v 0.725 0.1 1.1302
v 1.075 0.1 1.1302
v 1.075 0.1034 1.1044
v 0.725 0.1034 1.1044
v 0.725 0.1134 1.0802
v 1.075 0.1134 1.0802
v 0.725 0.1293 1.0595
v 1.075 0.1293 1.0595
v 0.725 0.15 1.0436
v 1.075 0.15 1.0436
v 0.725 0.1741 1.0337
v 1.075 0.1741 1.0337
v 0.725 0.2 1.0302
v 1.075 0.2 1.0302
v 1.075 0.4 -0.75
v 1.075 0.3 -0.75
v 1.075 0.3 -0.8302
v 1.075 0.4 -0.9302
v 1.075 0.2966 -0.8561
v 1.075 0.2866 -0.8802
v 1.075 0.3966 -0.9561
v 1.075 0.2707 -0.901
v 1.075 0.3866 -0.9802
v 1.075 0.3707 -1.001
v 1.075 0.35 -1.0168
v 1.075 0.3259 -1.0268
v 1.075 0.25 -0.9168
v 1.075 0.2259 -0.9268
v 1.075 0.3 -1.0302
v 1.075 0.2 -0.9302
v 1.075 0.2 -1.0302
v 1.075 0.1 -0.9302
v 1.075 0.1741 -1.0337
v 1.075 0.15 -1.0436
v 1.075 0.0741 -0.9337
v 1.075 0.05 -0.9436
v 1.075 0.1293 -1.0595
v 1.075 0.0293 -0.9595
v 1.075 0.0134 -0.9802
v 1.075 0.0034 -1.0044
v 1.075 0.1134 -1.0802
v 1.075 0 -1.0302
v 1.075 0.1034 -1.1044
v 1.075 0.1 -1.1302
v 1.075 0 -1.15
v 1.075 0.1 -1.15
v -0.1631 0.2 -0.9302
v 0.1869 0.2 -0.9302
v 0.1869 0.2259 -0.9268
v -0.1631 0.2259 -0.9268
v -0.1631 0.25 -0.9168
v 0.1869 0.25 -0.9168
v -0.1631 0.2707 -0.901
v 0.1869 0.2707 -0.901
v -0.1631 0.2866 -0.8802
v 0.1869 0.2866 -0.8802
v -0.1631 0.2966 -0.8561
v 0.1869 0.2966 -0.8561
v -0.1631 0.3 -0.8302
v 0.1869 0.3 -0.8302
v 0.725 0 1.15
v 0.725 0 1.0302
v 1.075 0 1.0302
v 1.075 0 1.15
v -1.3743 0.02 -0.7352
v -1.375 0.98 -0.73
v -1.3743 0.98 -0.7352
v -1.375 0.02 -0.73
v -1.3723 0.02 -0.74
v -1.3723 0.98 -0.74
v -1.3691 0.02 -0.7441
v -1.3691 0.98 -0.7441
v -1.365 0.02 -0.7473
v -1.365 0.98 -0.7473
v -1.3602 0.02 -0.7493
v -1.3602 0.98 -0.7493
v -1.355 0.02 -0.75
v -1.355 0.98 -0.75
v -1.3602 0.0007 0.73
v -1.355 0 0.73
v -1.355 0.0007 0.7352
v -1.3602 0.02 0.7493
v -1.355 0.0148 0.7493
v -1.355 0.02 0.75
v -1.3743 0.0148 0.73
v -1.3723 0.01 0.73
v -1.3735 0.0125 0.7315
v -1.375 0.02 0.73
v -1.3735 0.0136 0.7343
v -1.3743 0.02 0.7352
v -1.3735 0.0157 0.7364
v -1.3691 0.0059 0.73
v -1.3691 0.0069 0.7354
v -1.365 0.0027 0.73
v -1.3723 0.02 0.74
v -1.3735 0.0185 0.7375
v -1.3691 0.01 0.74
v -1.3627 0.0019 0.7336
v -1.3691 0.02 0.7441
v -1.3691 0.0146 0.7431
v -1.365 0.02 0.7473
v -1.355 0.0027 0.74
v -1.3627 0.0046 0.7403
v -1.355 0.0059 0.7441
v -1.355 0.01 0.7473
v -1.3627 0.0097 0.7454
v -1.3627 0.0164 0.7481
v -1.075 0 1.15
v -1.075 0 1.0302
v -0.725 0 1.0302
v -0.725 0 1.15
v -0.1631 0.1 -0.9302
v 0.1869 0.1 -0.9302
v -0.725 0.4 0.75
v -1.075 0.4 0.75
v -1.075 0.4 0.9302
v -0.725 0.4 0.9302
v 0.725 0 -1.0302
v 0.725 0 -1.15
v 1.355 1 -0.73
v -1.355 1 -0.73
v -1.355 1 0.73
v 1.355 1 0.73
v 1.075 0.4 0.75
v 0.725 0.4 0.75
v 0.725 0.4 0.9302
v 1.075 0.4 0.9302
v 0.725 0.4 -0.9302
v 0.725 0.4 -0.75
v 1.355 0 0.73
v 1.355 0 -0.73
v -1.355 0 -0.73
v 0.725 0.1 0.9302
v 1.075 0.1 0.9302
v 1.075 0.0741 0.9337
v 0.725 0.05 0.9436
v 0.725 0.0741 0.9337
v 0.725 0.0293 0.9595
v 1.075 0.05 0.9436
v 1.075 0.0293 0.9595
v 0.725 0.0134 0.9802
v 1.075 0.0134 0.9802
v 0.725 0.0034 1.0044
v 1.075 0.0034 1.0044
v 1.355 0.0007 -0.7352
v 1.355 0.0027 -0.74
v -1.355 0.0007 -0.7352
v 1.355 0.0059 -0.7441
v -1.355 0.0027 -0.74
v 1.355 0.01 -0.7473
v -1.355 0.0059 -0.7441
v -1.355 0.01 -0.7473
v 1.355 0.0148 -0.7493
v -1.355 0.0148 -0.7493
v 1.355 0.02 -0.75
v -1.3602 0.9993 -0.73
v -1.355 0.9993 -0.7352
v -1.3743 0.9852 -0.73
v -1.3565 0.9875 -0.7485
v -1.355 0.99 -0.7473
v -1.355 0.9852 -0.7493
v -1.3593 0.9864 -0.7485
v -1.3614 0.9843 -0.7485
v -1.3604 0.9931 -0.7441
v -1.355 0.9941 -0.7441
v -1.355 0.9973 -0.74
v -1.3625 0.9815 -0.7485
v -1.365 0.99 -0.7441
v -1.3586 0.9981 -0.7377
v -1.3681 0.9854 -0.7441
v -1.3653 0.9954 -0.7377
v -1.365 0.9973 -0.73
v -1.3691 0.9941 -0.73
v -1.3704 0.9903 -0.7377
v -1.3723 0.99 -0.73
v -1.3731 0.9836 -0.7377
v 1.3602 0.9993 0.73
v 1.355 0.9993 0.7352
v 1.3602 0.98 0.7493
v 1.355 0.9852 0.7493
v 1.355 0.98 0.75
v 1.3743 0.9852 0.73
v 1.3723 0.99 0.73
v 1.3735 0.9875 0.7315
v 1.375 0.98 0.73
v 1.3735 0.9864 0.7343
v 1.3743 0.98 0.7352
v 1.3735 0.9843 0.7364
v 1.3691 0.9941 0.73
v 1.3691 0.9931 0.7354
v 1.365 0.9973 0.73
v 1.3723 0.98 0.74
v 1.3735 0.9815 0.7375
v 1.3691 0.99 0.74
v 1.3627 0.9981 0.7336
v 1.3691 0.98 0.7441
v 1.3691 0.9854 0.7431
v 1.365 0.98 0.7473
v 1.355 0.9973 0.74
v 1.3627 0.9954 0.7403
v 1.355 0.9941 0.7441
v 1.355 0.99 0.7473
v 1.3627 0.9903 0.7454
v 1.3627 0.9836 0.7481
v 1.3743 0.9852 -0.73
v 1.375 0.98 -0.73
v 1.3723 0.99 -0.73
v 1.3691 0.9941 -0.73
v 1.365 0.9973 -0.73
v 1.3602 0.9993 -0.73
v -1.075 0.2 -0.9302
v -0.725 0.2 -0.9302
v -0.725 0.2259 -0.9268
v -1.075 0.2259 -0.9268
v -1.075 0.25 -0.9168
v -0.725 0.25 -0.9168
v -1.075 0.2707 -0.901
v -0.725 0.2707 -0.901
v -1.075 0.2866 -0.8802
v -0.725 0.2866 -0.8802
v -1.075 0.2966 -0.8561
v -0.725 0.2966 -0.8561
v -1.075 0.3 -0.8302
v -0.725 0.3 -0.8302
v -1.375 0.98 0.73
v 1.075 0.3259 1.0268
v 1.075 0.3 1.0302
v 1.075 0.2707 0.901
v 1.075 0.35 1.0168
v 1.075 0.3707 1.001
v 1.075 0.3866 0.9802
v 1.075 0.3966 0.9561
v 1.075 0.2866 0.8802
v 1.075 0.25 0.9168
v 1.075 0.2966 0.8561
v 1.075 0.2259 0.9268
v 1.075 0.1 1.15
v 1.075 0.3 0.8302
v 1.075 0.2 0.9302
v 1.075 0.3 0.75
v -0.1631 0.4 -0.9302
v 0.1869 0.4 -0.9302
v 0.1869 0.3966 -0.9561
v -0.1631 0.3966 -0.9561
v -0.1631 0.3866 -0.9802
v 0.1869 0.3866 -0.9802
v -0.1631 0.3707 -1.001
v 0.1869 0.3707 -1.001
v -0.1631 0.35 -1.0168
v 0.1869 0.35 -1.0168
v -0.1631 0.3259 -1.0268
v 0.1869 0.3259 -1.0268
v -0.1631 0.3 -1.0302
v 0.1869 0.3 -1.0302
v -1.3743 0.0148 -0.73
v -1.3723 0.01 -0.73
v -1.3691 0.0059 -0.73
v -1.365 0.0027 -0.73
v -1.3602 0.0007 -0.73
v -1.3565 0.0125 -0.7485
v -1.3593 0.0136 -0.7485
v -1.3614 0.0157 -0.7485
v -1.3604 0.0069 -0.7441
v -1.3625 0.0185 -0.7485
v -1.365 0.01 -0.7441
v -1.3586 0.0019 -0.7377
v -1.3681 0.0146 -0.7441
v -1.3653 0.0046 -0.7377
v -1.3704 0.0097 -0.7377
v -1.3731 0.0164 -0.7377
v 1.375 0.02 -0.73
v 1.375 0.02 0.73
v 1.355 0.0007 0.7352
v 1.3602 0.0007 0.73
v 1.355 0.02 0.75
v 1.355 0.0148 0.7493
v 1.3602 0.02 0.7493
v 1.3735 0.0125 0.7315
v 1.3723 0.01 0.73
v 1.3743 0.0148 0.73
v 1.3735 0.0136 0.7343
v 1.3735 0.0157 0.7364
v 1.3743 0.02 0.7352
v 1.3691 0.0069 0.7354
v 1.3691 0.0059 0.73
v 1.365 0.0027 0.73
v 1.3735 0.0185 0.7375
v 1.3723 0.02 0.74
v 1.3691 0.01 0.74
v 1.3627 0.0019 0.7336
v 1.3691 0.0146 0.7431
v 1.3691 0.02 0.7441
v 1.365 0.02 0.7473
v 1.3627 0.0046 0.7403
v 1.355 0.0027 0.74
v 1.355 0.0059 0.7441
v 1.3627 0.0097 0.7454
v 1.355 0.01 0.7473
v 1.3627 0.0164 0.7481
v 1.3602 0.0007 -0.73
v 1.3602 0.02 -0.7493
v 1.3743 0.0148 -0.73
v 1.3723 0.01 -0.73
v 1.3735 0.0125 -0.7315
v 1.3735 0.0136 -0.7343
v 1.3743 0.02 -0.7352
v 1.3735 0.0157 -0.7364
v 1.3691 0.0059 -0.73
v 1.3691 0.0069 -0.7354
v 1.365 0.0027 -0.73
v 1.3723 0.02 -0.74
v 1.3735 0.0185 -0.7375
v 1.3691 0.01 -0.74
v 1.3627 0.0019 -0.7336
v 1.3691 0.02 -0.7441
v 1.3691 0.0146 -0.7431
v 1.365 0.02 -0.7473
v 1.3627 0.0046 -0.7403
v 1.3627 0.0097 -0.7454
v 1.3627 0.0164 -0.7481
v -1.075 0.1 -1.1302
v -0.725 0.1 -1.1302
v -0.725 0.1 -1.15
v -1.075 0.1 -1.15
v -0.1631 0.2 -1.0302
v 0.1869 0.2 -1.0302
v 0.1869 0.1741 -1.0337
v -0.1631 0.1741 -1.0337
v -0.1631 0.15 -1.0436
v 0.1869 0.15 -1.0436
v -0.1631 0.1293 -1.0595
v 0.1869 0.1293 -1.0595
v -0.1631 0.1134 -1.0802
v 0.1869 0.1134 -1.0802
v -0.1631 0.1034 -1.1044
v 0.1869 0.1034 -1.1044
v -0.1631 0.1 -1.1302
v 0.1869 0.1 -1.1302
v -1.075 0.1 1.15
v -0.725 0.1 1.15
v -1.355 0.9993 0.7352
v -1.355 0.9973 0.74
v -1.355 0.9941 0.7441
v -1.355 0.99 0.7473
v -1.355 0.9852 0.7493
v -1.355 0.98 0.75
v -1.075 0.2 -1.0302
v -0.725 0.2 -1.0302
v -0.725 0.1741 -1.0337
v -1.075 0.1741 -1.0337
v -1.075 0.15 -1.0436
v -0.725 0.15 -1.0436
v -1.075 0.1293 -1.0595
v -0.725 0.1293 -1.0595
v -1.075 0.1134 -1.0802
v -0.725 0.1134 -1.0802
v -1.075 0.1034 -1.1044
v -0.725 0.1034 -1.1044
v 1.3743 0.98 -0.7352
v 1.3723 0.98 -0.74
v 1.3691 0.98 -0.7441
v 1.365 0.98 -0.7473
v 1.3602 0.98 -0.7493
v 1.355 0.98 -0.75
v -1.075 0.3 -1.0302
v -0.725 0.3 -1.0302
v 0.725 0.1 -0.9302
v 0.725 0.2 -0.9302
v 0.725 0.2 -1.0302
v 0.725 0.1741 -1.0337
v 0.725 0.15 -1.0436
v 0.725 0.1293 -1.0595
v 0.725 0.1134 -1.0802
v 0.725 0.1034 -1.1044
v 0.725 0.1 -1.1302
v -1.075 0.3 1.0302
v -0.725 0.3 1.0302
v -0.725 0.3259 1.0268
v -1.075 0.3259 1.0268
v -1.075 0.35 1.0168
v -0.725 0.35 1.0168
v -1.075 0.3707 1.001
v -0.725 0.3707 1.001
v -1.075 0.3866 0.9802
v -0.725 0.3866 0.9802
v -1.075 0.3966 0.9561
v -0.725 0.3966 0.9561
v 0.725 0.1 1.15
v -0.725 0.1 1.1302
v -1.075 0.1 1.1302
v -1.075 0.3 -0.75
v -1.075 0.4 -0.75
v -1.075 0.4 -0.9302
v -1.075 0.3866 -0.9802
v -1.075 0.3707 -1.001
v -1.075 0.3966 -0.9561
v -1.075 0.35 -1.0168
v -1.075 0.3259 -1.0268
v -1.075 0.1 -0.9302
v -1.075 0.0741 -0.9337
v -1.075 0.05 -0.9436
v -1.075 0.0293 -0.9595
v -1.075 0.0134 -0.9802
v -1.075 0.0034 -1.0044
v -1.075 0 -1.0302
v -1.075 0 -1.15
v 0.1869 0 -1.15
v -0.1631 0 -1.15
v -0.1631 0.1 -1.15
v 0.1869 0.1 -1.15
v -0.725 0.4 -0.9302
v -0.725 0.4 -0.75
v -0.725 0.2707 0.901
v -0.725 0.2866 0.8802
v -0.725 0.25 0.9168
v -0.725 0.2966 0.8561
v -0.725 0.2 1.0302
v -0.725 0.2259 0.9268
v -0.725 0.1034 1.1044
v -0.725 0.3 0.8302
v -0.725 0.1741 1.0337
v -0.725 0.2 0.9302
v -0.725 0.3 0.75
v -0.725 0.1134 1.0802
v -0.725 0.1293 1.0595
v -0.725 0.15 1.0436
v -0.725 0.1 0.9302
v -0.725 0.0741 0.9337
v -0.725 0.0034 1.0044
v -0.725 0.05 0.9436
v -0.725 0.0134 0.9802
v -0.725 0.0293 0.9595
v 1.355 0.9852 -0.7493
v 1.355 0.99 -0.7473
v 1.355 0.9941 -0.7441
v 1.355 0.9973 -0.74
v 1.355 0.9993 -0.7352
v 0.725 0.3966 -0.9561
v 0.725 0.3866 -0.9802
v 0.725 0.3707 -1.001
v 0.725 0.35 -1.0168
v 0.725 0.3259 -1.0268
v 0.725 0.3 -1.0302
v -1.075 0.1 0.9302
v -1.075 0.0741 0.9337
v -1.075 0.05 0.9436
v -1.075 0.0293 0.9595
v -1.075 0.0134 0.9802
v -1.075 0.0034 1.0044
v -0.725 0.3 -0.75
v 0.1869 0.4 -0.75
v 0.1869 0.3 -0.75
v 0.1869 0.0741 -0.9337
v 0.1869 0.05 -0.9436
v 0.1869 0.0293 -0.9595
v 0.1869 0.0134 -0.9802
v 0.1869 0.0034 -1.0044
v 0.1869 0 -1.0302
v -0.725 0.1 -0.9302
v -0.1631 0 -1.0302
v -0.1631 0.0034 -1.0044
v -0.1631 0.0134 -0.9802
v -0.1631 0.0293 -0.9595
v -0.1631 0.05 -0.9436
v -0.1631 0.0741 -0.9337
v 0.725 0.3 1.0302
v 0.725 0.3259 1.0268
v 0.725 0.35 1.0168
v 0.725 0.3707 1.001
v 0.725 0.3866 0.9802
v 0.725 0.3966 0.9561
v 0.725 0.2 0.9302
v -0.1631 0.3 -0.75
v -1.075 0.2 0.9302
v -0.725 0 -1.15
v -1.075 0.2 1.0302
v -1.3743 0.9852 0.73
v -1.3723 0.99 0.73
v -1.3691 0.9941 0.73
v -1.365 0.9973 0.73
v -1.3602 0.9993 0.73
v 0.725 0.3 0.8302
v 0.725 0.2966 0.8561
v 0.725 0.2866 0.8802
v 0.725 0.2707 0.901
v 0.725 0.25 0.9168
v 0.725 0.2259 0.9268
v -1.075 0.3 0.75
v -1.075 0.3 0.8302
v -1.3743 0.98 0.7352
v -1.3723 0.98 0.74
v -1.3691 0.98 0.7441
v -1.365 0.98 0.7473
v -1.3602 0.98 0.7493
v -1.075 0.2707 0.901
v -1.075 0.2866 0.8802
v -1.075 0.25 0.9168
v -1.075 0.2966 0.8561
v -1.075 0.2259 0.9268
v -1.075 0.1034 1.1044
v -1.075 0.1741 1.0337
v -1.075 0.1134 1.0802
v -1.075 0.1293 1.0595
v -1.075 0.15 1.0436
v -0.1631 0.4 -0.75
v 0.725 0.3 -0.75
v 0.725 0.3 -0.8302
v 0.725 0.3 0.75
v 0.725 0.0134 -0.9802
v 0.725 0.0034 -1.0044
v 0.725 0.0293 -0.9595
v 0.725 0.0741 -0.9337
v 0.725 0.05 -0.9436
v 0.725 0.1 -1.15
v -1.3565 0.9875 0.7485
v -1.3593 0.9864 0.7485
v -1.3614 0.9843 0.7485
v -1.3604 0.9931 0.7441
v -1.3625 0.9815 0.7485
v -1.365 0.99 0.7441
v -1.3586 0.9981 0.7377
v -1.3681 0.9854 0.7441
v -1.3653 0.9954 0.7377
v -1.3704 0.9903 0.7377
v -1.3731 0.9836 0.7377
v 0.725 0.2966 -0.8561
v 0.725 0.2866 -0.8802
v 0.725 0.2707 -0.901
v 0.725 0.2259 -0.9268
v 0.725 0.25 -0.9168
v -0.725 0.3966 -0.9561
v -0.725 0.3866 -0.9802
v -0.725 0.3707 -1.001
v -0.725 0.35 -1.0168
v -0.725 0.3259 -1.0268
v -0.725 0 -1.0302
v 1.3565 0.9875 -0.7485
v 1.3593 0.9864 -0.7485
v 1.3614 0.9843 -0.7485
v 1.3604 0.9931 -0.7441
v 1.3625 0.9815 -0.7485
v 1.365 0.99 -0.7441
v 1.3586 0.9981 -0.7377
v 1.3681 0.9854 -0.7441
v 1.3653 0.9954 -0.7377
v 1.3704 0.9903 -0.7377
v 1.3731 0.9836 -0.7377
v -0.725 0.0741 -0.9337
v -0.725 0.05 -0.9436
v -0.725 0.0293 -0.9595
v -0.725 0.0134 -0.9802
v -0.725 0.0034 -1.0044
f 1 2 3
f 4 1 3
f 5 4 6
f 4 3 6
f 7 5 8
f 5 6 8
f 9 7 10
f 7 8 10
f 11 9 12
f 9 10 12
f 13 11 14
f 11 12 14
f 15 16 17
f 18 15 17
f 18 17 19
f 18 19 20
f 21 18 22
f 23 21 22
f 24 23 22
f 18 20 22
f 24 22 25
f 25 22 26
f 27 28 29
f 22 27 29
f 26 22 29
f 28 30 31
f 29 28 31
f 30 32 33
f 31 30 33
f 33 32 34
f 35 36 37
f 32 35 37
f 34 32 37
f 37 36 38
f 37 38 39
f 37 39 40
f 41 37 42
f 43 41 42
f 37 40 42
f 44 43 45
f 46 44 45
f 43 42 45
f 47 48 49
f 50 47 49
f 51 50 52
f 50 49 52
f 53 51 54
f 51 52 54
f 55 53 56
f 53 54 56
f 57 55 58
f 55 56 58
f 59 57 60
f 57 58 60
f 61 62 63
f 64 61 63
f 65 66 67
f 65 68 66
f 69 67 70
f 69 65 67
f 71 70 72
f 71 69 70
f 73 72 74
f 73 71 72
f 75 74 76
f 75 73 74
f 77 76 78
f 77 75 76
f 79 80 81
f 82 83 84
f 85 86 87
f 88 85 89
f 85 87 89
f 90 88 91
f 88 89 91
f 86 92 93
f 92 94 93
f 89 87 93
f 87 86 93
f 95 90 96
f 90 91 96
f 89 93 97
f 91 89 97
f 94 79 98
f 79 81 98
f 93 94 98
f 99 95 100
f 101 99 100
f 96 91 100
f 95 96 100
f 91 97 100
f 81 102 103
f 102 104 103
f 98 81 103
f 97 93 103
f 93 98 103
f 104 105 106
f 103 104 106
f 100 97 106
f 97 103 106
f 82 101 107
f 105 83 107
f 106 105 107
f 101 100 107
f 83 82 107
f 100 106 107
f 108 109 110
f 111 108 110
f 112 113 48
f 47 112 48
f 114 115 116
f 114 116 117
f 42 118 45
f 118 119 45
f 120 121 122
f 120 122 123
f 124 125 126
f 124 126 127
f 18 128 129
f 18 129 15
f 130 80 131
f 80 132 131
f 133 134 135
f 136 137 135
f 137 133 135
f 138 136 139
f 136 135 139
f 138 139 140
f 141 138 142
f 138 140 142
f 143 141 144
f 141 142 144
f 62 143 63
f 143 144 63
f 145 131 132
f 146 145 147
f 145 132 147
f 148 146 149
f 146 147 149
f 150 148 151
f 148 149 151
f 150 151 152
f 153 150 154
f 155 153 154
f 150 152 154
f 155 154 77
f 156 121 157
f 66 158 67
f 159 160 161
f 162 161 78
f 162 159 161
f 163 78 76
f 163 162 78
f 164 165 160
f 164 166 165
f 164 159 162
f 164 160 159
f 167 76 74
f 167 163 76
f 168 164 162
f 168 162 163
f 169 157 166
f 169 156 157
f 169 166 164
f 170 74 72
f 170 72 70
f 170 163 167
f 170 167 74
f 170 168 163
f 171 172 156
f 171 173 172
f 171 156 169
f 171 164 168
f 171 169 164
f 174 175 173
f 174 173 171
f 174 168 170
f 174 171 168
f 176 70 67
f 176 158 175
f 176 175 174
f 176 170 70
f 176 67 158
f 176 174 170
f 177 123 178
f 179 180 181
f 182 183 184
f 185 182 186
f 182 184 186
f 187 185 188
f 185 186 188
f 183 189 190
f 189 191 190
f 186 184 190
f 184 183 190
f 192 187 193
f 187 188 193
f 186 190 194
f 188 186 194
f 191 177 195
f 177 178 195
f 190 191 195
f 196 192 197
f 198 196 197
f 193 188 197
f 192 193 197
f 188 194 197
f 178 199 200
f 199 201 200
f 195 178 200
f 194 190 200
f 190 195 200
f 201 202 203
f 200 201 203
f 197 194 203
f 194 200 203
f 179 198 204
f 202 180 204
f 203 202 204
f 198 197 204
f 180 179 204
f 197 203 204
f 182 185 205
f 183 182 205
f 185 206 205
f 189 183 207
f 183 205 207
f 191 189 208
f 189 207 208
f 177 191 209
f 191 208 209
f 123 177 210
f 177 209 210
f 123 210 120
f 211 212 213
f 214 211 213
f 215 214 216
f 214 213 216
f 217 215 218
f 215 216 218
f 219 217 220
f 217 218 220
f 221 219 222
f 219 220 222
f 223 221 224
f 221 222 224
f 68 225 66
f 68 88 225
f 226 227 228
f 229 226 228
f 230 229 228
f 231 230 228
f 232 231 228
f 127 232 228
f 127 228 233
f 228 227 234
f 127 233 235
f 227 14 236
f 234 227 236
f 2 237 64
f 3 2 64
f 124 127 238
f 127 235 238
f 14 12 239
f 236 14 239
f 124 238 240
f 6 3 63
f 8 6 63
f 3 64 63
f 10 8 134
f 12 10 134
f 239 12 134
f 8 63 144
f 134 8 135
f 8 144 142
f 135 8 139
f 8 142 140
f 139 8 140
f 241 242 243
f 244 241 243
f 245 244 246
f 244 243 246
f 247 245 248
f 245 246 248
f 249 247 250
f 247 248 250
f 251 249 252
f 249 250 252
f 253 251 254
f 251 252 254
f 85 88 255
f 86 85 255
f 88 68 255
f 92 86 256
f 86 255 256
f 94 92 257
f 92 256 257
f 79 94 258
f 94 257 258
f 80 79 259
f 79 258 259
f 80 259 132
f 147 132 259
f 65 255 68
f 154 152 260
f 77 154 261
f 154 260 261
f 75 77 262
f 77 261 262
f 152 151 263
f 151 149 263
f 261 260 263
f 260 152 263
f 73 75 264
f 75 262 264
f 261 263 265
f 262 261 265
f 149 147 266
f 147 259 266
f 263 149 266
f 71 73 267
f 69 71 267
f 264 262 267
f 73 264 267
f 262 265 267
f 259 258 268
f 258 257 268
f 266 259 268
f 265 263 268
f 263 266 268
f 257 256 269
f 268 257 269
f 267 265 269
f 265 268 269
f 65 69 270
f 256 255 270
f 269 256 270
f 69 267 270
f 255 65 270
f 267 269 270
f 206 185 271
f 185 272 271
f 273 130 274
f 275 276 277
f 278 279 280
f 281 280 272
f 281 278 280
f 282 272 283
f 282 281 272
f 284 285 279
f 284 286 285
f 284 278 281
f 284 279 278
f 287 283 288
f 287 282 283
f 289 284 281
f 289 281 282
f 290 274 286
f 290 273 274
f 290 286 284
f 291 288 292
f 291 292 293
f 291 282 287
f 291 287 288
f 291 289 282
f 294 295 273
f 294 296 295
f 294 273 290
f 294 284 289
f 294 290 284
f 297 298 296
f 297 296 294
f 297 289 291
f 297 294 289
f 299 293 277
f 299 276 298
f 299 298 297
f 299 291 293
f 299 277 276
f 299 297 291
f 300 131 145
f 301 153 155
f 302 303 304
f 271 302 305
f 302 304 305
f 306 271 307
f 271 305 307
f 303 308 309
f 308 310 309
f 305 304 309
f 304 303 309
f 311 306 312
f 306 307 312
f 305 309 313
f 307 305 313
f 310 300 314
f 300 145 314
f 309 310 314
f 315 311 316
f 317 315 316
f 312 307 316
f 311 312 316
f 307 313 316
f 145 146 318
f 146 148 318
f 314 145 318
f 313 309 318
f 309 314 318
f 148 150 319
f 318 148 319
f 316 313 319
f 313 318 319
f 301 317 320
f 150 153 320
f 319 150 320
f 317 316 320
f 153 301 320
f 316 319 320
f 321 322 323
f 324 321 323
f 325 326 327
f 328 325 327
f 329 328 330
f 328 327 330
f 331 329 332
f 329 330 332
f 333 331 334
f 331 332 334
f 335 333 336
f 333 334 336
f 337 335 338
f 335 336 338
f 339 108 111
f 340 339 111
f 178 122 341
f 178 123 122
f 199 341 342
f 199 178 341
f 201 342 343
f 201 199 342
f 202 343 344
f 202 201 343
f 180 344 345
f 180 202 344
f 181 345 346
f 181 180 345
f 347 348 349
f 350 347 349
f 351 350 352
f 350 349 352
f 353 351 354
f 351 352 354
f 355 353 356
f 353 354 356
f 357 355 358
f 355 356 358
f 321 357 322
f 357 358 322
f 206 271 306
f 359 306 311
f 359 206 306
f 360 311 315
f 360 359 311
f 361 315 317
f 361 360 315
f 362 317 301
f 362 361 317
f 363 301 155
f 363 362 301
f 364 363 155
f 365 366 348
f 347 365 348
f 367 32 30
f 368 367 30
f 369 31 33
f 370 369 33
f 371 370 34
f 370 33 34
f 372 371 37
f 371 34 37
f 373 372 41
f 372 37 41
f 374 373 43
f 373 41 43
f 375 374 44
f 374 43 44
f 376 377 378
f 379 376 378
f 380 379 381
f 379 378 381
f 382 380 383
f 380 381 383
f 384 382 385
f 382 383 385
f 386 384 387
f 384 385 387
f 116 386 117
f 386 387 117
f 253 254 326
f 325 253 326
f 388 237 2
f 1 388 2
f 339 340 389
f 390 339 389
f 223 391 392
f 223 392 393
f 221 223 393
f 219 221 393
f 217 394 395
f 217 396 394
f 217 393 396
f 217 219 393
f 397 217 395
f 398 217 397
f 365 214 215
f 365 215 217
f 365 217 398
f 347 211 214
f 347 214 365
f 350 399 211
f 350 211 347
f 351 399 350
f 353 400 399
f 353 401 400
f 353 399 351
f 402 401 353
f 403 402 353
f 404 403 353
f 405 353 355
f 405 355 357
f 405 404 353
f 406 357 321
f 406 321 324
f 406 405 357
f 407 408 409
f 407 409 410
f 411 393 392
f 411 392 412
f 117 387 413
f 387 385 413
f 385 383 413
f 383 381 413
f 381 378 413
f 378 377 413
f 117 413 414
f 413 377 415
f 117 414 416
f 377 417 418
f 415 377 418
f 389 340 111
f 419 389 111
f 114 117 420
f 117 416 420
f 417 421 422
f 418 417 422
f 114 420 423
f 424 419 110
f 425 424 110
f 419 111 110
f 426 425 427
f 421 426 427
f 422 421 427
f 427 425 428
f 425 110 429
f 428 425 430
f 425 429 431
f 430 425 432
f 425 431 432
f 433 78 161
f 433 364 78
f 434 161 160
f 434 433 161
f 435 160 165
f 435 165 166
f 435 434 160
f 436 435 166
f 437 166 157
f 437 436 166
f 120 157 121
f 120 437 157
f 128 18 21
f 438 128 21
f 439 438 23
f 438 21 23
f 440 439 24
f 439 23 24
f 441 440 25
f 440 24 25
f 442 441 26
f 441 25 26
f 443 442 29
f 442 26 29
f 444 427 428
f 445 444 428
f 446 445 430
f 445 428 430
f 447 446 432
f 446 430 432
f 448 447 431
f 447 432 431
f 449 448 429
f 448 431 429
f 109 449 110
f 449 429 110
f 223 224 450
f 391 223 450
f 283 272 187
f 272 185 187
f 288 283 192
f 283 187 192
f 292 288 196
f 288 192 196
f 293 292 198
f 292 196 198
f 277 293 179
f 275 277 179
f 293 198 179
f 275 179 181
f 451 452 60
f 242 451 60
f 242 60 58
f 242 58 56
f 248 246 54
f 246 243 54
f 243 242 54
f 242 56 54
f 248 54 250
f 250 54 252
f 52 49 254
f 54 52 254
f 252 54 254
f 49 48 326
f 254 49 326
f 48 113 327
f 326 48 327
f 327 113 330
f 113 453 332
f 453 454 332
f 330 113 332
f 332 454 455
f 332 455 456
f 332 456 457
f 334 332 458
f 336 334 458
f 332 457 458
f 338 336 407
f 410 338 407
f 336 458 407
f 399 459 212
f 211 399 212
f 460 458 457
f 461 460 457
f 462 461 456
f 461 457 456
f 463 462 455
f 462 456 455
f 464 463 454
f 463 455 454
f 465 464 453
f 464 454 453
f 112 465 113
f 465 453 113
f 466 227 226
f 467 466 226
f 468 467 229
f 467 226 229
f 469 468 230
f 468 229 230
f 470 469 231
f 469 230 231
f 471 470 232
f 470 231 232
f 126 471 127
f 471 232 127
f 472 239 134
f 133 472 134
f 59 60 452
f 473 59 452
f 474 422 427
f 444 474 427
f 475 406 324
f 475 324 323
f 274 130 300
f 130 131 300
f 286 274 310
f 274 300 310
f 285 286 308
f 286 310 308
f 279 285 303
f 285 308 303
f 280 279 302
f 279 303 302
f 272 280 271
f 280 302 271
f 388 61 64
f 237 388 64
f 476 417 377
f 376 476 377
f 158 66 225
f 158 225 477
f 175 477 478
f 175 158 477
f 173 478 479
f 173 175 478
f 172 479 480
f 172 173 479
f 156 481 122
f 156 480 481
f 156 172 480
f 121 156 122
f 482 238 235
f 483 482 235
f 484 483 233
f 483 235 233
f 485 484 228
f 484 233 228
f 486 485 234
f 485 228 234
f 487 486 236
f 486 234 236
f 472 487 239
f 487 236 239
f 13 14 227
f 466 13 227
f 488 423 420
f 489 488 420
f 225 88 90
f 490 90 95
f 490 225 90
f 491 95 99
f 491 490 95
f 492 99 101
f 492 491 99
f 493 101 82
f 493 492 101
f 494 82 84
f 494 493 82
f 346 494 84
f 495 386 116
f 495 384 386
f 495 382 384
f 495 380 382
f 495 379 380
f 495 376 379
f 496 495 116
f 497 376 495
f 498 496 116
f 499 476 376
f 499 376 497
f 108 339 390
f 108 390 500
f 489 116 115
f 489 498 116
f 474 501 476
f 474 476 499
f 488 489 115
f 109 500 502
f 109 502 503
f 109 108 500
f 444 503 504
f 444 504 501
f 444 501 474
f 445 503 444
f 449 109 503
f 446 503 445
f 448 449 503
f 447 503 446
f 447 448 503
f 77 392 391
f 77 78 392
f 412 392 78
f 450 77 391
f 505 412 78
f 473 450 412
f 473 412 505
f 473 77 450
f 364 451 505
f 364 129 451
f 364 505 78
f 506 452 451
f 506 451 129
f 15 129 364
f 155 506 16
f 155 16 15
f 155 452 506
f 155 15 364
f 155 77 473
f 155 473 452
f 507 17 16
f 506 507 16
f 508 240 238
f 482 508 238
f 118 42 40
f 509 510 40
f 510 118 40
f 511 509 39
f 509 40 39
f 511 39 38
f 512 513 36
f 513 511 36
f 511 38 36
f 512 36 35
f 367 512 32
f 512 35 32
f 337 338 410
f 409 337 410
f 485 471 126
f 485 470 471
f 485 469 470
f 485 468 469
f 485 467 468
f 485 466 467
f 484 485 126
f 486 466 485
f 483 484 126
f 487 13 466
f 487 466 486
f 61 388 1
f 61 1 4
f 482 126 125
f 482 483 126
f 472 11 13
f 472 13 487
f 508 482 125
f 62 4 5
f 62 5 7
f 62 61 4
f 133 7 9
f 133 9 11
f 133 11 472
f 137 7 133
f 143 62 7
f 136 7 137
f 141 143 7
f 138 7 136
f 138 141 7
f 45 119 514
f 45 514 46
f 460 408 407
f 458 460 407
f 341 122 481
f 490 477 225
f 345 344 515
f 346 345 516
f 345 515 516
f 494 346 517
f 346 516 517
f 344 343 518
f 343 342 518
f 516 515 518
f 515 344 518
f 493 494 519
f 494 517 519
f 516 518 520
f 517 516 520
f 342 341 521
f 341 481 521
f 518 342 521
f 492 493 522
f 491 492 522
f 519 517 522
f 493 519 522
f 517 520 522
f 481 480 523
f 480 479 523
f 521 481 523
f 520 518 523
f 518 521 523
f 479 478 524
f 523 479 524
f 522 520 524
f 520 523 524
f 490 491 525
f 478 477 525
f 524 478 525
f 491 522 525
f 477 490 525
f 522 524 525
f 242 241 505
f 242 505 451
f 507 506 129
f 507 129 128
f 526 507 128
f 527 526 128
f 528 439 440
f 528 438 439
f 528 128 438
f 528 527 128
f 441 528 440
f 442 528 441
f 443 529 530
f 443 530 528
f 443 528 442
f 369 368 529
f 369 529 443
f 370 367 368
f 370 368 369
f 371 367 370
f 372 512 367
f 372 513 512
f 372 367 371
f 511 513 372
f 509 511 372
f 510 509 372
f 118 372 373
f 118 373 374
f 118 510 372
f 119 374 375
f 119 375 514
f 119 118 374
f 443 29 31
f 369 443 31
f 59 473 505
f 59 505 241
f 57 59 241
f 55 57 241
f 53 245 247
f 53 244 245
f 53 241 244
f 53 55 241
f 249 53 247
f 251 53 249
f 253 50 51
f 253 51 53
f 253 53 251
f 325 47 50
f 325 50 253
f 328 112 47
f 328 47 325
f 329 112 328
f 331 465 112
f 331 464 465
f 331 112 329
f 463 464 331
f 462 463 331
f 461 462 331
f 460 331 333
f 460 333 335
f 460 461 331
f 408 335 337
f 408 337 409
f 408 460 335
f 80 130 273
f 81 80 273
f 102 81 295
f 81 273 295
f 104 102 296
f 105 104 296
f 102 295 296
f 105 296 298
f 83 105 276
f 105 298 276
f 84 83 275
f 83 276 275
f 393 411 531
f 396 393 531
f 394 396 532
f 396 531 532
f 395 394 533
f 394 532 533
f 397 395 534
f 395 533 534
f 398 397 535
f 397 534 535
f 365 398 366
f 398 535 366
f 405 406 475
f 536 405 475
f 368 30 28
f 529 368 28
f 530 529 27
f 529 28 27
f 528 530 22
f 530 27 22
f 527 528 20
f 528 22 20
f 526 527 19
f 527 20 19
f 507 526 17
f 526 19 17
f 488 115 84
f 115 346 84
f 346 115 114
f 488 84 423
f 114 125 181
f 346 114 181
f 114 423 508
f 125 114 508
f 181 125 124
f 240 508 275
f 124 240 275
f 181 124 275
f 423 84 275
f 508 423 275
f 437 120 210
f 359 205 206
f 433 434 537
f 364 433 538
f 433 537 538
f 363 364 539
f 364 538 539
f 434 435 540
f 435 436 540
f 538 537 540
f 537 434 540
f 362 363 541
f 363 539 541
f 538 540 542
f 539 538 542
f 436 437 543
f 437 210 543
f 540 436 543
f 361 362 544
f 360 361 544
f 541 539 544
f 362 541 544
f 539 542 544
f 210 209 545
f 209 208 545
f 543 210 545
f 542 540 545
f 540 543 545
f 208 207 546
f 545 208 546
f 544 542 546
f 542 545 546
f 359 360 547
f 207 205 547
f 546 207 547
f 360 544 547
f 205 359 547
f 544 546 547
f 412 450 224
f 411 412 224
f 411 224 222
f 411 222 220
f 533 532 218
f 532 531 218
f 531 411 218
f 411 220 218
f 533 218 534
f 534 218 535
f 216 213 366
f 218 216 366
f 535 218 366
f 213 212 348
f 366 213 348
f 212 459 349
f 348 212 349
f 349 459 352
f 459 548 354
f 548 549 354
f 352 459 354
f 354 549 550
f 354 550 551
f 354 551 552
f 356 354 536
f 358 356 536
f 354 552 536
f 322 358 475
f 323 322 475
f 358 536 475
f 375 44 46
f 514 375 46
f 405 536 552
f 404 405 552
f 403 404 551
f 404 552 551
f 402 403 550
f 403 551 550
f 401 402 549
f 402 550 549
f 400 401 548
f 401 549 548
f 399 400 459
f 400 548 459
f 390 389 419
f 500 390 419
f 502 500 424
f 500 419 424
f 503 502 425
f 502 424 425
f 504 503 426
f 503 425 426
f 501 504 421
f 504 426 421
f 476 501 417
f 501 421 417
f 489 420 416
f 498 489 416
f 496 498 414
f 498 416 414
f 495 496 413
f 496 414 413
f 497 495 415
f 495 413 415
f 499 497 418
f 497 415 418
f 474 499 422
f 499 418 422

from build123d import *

# Parameters (mm, degrees)
SKETCH1_W           = 2.75
SKETCH1_H           = 1.5
BOSS_EXTRUDE1_DEPTH = 1
SKETCH2_W           = 0.35
SKETCH2_H           = 0.4
BOSS_EXTRUDE2_DEPTH = 0.4
CUT_EXTRUDE1_DEPTH  = 3.45
FILLET1_R           = 0.02


with BuildPart() as part:
    # Sketch1 → Boss-Extrude1 (new body)
    with BuildSketch(Plane(origin=(0, 0, 0), x_dir=(1, 0, 0), z_dir=(0, 1, 0))):
        Rectangle(SKETCH1_W, SKETCH1_H)
    extrude(amount=BOSS_EXTRUDE1_DEPTH)

    # Sketch2 → Boss-Extrude2 (add)
    with BuildSketch(Plane(origin=(0, 0, 0), x_dir=(1, 0, 0), z_dir=(0, 1, 0))):
        with Locations((-0.9, -0.95)):
            Rectangle(SKETCH2_W, SKETCH2_H)
        with Locations((0.9, -0.95)):
            Rectangle(SKETCH2_W, SKETCH2_H)
        with Locations((0.9, 0.95)):
            Rectangle(SKETCH2_W, SKETCH2_H)
        with Locations((-0.9, 0.95)):
            Rectangle(SKETCH2_W, SKETCH2_H)
        with Locations((0.01189142, 0.95)):
            Rectangle(SKETCH2_W, SKETCH2_H)
    extrude(amount=BOSS_EXTRUDE2_DEPTH)

    # Sketch3 → Cut-Extrude1 (cut, through all)
    with BuildSketch(Plane(origin=(1.075, 0, 0), x_dir=(0, 0, -1), z_dir=(1, 0, 0))):
        with BuildLine():
            Line((1.15, 0), (1.03024595, 0))
            Line((1.03024595, 0), (0.75, 0))
            Line((0.75, 0), (-0.75, 0))
            Line((-0.75, 0), (-0.75, 0.3))
            Line((-0.75, 0.3), (-0.83024595, 0.3))
            ThreePointArc((-0.83024595, 0.3), (-0.900956628, 0.270710678), (-0.93024595, 0.2))
            Line((-0.93024595, 0.2), (-0.93024595, 0.1))
            ThreePointArc((-0.93024595, 0.1), (-0.959535272, 0.029289322), (-1.03024595, 0))
            Line((-1.03024595, 0), (-1.15, 0))
            Line((-1.15, 0), (-1.15, 0.1))
            Line((-1.15, 0.1), (-1.13024595, 0.1))
            ThreePointArc((-1.13024595, 0.1), (-1.059535272, 0.129289322), (-1.03024595, 0.2))
            Line((-1.03024595, 0.2), (-1.03024595, 0.3))
            ThreePointArc((-1.03024595, 0.3), (-1.000956628, 0.370710678), (-0.93024595, 0.4))
            Line((-0.93024595, 0.4), (-0.75, 0.4))
            Line((-0.75, 0.4), (-0.75, 0.722069531))
            Line((-0.75, 0.722069531), (-1.439294861, 0.722069531))
            Line((-1.439294861, 0.722069531), (-1.439294861, -0.262815914))
            Line((-1.439294861, -0.262815914), (1.563550176, -0.262815914))
            Line((1.563550176, -0.262815914), (1.563550176, 0.722069531))
            Line((1.563550176, 0.722069531), (0.75, 0.722069531))
            Line((0.75, 0.722069531), (0.75, 0.4))
            Line((0.75, 0.4), (0.93024595, 0.4))
            Line((0.93024595, 0.4), (1.15, 0.4))
            Line((1.15, 0.4), (1.15, 0.1))
            Line((1.15, 0.1), (1.15, 0))
        make_face()
        with BuildLine():
            Line((0.75, 0), (1.03024595, 0))
            ThreePointArc((1.03024595, 0), (0.959535272, 0.029289322), (0.93024595, 0.1))
            Line((0.93024595, 0.1), (0.93024595, 0.2))
            ThreePointArc((0.93024595, 0.2), (0.900956628, 0.270710678), (0.83024595, 0.3))
            Line((0.83024595, 0.3), (0.75, 0.3))
            Line((0.75, 0.3), (0.75, 0))
        make_face()
        with BuildLine():
            Line((1.13024595, 0.1), (1.15, 0.1))
            Line((1.15, 0.1), (1.15, 0.4))
            Line((1.15, 0.4), (0.93024595, 0.4))
            ThreePointArc((0.93024595, 0.4), (1.000956628, 0.370710678), (1.03024595, 0.3))
            Line((1.03024595, 0.3), (1.03024595, 0.2))
            ThreePointArc((1.03024595, 0.2), (1.059535272, 0.129289322), (1.13024595, 0.1))
        make_face()
    extrude(amount=-CUT_EXTRUDE1_DEPTH, mode=Mode.SUBTRACT)

    # Fillet1
    fillet1_edges = [part.edges().sort_by_distance(p)[0] for p in [
        (-1.375, 1, 0),
        (0, 1, 0.75),
        (1.375, 1, 0),
        (0, 0, 0.75),
        (-1.375, 0, 0),
        (0, 0, -0.75),
        (1.375, 0, 0),
        (0, 1, -0.75),
        (1.375, 0.5, 0.75),
        (-1.375, 0.5, 0.75),
        (-1.375, 0.5, -0.75),
        (1.375, 0.5, -0.75),
    ]]
    fillet(fillet1_edges, radius=FILLET1_R)


solid = part.part
